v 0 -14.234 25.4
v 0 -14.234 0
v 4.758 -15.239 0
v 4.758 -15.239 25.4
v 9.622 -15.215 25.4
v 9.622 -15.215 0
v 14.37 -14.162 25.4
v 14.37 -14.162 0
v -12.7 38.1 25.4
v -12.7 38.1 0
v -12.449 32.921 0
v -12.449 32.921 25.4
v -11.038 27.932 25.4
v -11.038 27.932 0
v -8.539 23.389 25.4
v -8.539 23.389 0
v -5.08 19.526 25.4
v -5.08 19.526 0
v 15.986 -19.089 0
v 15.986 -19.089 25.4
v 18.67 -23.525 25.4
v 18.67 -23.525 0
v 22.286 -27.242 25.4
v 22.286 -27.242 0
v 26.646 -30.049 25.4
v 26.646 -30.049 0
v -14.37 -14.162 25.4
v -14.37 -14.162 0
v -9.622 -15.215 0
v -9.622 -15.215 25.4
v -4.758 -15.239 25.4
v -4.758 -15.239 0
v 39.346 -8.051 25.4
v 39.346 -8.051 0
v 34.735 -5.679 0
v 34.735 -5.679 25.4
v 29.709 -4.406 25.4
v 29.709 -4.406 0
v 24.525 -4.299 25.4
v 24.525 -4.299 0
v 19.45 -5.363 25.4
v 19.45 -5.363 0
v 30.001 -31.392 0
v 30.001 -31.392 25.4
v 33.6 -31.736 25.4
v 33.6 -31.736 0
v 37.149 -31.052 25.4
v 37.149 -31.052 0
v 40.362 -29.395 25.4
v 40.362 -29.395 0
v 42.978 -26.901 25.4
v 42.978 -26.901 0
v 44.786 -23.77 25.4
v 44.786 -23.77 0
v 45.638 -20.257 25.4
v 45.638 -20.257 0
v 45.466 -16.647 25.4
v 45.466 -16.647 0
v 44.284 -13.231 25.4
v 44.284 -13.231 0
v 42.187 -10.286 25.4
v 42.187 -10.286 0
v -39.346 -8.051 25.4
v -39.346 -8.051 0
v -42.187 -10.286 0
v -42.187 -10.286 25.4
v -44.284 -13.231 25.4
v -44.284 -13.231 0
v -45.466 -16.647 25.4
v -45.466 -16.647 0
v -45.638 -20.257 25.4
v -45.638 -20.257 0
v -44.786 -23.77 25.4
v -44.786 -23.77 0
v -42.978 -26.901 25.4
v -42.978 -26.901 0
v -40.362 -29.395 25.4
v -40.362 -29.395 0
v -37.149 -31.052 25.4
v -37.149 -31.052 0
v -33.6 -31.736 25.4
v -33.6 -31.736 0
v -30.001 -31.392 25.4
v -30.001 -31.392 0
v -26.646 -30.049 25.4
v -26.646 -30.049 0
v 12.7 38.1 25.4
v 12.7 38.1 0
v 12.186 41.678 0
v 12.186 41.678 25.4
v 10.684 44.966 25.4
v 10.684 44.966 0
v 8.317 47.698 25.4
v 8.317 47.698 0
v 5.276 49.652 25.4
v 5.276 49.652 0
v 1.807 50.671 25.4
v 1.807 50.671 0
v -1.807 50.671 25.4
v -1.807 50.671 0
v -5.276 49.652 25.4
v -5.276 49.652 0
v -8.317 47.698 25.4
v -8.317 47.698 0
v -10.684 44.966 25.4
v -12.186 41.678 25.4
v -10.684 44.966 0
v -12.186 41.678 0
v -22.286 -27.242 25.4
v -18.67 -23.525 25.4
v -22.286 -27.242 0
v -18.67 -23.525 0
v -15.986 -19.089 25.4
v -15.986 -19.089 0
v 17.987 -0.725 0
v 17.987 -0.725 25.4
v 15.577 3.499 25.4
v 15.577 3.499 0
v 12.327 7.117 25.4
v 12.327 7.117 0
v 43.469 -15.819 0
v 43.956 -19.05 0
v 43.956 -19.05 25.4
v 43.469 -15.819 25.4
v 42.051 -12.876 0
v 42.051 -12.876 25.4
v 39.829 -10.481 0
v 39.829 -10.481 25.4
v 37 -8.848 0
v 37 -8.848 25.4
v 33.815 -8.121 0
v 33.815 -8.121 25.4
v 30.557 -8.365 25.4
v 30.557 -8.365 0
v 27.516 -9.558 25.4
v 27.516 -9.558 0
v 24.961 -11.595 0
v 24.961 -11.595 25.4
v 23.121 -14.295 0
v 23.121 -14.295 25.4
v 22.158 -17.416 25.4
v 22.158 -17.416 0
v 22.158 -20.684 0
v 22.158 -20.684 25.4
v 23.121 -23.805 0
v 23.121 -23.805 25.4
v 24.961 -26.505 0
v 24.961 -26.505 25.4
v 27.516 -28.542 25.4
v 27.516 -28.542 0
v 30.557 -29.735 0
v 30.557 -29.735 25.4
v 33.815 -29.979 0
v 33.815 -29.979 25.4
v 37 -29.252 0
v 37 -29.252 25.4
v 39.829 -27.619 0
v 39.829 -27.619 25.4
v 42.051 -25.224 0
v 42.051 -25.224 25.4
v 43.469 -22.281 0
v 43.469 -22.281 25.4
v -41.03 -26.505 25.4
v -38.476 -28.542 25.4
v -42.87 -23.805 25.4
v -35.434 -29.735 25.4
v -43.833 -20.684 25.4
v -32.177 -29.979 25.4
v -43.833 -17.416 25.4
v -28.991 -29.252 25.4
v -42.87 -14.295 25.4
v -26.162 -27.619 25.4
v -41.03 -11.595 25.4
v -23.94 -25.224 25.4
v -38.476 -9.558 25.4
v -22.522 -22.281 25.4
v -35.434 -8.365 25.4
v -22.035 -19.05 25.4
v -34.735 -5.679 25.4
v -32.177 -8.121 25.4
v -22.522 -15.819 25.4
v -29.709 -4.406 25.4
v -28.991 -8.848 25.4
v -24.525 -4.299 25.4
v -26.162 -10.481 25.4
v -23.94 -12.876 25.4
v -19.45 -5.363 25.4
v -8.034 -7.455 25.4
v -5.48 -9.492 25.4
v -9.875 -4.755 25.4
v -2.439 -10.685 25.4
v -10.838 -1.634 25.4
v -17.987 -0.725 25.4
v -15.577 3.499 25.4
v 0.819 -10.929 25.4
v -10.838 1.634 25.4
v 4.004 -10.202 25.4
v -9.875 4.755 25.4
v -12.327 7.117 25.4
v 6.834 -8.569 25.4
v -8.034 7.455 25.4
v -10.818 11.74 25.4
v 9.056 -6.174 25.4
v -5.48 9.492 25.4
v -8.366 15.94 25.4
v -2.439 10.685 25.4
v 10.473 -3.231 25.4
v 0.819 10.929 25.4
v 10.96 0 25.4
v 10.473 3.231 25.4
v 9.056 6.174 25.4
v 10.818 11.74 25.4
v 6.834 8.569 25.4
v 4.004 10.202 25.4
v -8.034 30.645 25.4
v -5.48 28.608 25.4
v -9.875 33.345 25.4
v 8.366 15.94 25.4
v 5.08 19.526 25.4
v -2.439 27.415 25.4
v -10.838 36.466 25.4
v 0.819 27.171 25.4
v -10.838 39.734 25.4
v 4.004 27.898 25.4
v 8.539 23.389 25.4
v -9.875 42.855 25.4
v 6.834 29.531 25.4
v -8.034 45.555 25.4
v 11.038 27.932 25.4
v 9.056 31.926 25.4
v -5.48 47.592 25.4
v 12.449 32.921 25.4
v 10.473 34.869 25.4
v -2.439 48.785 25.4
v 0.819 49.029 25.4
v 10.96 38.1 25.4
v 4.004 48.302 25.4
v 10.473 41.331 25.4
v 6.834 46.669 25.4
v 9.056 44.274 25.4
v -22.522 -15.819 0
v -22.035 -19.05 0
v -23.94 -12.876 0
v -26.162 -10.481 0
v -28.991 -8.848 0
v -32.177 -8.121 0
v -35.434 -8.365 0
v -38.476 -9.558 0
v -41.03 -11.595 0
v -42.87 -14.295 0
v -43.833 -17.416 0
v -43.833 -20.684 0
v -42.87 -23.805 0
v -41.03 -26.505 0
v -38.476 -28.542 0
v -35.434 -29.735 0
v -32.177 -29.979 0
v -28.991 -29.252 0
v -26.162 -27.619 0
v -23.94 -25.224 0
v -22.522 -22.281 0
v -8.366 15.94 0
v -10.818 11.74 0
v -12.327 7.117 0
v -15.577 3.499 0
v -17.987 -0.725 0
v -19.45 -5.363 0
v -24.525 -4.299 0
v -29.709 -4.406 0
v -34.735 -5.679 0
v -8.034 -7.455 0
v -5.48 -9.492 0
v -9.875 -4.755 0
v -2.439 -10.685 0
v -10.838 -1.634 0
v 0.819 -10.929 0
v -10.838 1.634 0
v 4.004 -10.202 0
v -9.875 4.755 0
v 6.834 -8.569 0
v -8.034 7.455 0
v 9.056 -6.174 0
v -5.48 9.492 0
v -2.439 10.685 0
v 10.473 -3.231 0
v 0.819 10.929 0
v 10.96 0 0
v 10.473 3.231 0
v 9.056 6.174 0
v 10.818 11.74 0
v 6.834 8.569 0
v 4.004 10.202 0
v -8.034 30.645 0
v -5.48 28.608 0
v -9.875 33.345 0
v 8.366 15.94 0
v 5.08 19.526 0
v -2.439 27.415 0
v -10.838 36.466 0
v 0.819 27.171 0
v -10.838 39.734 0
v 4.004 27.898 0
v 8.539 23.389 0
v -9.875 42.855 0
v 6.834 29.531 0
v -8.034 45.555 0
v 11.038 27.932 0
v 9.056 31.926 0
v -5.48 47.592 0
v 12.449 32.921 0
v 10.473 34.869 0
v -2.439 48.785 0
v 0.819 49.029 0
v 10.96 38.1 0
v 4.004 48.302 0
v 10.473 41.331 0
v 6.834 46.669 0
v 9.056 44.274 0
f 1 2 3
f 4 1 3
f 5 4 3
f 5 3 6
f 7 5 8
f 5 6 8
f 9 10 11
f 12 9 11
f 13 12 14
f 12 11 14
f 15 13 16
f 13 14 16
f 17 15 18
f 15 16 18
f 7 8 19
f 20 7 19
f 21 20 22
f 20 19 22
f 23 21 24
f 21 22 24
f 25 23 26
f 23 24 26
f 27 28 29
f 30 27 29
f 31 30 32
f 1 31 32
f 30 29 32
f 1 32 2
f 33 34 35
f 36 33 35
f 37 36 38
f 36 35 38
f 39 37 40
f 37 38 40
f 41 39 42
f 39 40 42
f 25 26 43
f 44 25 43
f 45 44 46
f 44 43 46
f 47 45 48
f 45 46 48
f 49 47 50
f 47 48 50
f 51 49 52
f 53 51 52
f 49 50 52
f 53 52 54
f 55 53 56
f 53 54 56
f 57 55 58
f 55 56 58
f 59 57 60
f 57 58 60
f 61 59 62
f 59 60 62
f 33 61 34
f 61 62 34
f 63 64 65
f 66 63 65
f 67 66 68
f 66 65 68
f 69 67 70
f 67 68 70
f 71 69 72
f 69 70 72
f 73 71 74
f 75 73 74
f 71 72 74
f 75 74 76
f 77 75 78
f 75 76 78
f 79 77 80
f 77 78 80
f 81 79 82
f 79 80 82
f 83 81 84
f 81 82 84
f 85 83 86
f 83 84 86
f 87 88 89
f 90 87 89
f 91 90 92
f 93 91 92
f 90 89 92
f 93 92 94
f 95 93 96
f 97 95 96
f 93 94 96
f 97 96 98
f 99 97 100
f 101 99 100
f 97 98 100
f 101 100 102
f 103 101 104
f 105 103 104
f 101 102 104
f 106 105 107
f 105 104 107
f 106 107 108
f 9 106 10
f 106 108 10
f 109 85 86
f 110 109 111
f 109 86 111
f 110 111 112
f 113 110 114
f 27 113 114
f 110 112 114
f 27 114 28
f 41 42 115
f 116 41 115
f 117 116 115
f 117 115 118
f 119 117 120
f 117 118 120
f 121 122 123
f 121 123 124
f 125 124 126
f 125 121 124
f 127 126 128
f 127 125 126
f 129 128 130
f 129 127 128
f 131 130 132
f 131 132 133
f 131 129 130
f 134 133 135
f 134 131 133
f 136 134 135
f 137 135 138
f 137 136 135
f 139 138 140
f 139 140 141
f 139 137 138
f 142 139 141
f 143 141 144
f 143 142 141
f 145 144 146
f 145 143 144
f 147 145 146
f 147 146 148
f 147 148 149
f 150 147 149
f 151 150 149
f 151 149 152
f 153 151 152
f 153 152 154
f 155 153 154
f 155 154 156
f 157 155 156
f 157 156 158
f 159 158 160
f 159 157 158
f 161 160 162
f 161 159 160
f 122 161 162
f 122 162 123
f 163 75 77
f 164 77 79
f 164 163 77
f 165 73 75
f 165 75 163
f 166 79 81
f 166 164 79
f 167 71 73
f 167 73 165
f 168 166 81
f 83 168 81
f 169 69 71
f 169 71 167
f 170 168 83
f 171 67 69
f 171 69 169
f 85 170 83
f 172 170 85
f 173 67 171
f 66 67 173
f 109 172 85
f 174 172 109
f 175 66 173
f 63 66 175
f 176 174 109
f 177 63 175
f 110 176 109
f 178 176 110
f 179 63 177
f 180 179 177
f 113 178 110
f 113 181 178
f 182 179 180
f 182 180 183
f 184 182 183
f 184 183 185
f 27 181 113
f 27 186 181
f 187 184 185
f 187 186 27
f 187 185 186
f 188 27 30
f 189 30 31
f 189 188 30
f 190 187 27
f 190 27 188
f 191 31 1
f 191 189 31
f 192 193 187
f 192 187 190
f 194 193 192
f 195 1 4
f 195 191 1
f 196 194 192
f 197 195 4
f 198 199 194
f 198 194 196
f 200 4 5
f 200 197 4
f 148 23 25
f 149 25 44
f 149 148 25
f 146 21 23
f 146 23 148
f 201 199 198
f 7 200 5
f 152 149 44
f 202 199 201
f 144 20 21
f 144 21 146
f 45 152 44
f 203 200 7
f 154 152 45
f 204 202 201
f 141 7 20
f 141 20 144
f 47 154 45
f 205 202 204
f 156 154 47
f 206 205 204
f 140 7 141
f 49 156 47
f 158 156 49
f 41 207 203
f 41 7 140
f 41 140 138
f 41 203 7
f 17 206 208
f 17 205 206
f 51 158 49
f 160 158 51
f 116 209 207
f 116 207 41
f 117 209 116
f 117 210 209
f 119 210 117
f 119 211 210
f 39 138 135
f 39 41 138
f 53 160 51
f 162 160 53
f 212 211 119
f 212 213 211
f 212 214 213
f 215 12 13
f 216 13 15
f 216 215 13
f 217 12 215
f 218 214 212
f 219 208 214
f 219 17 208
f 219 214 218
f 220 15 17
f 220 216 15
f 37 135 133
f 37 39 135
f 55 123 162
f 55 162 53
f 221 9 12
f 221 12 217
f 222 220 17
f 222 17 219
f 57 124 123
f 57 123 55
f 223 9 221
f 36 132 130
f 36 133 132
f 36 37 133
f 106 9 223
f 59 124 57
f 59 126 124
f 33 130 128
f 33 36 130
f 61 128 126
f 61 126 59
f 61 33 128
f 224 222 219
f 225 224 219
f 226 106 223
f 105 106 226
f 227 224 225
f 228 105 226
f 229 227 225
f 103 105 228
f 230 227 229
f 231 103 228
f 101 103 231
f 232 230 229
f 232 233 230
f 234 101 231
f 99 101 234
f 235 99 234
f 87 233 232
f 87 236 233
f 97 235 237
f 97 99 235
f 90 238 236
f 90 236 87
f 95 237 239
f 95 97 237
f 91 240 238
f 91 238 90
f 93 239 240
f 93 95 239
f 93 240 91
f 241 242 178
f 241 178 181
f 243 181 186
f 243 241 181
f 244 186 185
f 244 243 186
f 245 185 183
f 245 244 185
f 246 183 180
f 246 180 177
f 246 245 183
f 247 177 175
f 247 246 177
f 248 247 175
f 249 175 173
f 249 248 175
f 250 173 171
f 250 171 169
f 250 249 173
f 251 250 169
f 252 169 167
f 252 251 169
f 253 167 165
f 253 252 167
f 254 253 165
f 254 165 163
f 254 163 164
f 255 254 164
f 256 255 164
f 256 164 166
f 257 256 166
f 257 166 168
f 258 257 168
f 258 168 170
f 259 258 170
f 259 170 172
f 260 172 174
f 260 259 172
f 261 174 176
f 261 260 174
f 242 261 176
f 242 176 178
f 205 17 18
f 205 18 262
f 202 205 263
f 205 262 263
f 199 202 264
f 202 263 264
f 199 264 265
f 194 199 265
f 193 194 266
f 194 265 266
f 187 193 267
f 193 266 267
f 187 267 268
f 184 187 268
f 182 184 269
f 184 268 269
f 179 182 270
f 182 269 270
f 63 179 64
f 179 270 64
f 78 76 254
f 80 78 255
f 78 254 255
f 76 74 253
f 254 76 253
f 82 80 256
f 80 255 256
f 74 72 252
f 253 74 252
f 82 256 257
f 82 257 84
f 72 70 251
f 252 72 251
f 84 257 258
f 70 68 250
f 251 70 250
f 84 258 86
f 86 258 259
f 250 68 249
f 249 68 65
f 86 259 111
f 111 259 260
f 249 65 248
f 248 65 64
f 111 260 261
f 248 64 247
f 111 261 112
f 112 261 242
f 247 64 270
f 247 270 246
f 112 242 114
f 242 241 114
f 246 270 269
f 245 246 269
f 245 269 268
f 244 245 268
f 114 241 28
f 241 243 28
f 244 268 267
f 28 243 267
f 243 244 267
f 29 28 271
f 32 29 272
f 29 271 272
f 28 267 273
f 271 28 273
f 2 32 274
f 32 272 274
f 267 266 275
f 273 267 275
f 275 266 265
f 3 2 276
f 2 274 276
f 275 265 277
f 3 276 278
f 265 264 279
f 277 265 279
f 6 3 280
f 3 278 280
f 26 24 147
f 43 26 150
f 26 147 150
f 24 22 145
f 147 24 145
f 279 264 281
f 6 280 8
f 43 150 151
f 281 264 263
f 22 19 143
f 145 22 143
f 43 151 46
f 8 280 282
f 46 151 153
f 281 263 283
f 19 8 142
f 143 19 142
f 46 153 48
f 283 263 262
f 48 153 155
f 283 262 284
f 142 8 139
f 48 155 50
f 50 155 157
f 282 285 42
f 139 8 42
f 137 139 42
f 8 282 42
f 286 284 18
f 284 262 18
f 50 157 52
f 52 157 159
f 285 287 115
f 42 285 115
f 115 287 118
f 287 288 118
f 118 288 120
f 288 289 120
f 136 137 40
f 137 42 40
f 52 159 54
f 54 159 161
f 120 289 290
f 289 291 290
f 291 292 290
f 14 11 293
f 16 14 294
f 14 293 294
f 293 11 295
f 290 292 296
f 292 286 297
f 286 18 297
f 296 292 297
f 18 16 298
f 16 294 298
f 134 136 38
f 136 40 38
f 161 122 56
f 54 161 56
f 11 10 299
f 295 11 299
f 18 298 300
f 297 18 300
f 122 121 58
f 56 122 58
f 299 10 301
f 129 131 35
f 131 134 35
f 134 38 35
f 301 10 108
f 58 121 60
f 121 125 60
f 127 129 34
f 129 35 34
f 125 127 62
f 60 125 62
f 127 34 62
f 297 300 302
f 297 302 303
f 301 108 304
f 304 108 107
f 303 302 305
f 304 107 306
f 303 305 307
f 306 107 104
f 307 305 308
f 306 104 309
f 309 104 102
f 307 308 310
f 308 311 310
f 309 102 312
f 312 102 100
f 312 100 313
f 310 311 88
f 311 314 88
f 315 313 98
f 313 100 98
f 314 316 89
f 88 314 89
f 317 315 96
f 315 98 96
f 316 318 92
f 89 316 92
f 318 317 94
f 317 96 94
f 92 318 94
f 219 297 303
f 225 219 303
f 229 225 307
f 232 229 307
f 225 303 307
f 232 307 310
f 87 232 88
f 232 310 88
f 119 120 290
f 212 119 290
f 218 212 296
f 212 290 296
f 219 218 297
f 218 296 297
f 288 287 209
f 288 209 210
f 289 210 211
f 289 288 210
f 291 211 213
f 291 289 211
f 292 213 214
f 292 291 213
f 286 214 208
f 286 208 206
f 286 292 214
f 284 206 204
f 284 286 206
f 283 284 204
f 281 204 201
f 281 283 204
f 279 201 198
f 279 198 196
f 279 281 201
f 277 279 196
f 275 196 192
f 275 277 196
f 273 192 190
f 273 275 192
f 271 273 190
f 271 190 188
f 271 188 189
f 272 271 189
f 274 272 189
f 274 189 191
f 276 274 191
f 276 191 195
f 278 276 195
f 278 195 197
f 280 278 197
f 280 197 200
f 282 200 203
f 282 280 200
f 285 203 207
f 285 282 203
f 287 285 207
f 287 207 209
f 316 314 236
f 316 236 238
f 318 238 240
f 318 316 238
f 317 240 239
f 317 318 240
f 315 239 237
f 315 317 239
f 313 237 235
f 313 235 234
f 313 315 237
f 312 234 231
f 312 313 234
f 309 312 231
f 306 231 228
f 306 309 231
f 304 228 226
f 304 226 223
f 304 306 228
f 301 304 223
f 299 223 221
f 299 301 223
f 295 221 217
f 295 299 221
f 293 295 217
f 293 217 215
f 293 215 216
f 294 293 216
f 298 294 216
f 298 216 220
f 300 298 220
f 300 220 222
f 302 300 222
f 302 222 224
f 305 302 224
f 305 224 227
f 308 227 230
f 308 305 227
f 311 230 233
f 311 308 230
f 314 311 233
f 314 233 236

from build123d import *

# Parameters (mm, degrees)
F0_R     = 10.9601
F0_R_2   = 12.7
F1_DEPTH = 25.4


with BuildPart() as f1:
    # F0 (on Top) → F1 (new body)
    with BuildSketch(Plane.XY):
        with BuildLine():
            ThreePointArc((5.08, 19.525683), (11.038189, 27.93156), (12.7, 38.1))
            ThreePointArc((12.7, 38.1), (0, 50.8), (-12.7, 38.1))
            ThreePointArc((-12.7, 38.1), (-11.038189, 27.93156), (-5.08, 19.525683))
            ThreePointArc((-5.08, 19.525683), (-9.703888, 13.905597), (-12.327043, 7.117022))
            ThreePointArc((-12.327043, 7.117022), (-16.894544, 1.451015), (-19.449737, -5.363432))
            ThreePointArc((-19.449737, -5.363432), (-29.708535, -4.406428), (-39.345568, -8.051477))
            ThreePointArc((-39.345568, -8.051477), (-43.994091, -25.4), (-26.645568, -30.048523))
            ThreePointArc((-26.645568, -30.048523), (-18.670346, -23.525132), (-14.369737, -14.16225))
            ThreePointArc((-14.369737, -14.16225), (-7.190656, -15.356612), (0, -14.234043))
            ThreePointArc((0, -14.234043), (7.190656, -15.356612), (14.369737, -14.16225))
            ThreePointArc((14.369737, -14.16225), (18.670346, -23.525132), (26.645568, -30.048523))
            ThreePointArc((26.645568, -30.048523), (43.994091, -25.4), (39.345568, -8.051477))
            ThreePointArc((39.345568, -8.051477), (29.708535, -4.406428), (19.449737, -5.363432))
            ThreePointArc((19.449737, -5.363432), (16.894544, 1.451015), (12.327043, 7.117022))
            ThreePointArc((12.327043, 7.117022), (9.703888, 13.905597), (5.08, 19.525683))
        make_face()
        with Locations((-32.995568, -19.05)):
            Circle(F0_R, mode=Mode.SUBTRACT)
        with Locations((32.995568, -19.05)):
            Circle(F0_R, mode=Mode.SUBTRACT)
        Circle(F0_R_2, mode=Mode.SUBTRACT)
        with Locations((0, 38.1)):
            Circle(F0_R, mode=Mode.SUBTRACT)
        Circle(F0_R_2)
        Circle(F0_R, mode=Mode.SUBTRACT)
    extrude(amount=F1_DEPTH)


solid = f1.part
